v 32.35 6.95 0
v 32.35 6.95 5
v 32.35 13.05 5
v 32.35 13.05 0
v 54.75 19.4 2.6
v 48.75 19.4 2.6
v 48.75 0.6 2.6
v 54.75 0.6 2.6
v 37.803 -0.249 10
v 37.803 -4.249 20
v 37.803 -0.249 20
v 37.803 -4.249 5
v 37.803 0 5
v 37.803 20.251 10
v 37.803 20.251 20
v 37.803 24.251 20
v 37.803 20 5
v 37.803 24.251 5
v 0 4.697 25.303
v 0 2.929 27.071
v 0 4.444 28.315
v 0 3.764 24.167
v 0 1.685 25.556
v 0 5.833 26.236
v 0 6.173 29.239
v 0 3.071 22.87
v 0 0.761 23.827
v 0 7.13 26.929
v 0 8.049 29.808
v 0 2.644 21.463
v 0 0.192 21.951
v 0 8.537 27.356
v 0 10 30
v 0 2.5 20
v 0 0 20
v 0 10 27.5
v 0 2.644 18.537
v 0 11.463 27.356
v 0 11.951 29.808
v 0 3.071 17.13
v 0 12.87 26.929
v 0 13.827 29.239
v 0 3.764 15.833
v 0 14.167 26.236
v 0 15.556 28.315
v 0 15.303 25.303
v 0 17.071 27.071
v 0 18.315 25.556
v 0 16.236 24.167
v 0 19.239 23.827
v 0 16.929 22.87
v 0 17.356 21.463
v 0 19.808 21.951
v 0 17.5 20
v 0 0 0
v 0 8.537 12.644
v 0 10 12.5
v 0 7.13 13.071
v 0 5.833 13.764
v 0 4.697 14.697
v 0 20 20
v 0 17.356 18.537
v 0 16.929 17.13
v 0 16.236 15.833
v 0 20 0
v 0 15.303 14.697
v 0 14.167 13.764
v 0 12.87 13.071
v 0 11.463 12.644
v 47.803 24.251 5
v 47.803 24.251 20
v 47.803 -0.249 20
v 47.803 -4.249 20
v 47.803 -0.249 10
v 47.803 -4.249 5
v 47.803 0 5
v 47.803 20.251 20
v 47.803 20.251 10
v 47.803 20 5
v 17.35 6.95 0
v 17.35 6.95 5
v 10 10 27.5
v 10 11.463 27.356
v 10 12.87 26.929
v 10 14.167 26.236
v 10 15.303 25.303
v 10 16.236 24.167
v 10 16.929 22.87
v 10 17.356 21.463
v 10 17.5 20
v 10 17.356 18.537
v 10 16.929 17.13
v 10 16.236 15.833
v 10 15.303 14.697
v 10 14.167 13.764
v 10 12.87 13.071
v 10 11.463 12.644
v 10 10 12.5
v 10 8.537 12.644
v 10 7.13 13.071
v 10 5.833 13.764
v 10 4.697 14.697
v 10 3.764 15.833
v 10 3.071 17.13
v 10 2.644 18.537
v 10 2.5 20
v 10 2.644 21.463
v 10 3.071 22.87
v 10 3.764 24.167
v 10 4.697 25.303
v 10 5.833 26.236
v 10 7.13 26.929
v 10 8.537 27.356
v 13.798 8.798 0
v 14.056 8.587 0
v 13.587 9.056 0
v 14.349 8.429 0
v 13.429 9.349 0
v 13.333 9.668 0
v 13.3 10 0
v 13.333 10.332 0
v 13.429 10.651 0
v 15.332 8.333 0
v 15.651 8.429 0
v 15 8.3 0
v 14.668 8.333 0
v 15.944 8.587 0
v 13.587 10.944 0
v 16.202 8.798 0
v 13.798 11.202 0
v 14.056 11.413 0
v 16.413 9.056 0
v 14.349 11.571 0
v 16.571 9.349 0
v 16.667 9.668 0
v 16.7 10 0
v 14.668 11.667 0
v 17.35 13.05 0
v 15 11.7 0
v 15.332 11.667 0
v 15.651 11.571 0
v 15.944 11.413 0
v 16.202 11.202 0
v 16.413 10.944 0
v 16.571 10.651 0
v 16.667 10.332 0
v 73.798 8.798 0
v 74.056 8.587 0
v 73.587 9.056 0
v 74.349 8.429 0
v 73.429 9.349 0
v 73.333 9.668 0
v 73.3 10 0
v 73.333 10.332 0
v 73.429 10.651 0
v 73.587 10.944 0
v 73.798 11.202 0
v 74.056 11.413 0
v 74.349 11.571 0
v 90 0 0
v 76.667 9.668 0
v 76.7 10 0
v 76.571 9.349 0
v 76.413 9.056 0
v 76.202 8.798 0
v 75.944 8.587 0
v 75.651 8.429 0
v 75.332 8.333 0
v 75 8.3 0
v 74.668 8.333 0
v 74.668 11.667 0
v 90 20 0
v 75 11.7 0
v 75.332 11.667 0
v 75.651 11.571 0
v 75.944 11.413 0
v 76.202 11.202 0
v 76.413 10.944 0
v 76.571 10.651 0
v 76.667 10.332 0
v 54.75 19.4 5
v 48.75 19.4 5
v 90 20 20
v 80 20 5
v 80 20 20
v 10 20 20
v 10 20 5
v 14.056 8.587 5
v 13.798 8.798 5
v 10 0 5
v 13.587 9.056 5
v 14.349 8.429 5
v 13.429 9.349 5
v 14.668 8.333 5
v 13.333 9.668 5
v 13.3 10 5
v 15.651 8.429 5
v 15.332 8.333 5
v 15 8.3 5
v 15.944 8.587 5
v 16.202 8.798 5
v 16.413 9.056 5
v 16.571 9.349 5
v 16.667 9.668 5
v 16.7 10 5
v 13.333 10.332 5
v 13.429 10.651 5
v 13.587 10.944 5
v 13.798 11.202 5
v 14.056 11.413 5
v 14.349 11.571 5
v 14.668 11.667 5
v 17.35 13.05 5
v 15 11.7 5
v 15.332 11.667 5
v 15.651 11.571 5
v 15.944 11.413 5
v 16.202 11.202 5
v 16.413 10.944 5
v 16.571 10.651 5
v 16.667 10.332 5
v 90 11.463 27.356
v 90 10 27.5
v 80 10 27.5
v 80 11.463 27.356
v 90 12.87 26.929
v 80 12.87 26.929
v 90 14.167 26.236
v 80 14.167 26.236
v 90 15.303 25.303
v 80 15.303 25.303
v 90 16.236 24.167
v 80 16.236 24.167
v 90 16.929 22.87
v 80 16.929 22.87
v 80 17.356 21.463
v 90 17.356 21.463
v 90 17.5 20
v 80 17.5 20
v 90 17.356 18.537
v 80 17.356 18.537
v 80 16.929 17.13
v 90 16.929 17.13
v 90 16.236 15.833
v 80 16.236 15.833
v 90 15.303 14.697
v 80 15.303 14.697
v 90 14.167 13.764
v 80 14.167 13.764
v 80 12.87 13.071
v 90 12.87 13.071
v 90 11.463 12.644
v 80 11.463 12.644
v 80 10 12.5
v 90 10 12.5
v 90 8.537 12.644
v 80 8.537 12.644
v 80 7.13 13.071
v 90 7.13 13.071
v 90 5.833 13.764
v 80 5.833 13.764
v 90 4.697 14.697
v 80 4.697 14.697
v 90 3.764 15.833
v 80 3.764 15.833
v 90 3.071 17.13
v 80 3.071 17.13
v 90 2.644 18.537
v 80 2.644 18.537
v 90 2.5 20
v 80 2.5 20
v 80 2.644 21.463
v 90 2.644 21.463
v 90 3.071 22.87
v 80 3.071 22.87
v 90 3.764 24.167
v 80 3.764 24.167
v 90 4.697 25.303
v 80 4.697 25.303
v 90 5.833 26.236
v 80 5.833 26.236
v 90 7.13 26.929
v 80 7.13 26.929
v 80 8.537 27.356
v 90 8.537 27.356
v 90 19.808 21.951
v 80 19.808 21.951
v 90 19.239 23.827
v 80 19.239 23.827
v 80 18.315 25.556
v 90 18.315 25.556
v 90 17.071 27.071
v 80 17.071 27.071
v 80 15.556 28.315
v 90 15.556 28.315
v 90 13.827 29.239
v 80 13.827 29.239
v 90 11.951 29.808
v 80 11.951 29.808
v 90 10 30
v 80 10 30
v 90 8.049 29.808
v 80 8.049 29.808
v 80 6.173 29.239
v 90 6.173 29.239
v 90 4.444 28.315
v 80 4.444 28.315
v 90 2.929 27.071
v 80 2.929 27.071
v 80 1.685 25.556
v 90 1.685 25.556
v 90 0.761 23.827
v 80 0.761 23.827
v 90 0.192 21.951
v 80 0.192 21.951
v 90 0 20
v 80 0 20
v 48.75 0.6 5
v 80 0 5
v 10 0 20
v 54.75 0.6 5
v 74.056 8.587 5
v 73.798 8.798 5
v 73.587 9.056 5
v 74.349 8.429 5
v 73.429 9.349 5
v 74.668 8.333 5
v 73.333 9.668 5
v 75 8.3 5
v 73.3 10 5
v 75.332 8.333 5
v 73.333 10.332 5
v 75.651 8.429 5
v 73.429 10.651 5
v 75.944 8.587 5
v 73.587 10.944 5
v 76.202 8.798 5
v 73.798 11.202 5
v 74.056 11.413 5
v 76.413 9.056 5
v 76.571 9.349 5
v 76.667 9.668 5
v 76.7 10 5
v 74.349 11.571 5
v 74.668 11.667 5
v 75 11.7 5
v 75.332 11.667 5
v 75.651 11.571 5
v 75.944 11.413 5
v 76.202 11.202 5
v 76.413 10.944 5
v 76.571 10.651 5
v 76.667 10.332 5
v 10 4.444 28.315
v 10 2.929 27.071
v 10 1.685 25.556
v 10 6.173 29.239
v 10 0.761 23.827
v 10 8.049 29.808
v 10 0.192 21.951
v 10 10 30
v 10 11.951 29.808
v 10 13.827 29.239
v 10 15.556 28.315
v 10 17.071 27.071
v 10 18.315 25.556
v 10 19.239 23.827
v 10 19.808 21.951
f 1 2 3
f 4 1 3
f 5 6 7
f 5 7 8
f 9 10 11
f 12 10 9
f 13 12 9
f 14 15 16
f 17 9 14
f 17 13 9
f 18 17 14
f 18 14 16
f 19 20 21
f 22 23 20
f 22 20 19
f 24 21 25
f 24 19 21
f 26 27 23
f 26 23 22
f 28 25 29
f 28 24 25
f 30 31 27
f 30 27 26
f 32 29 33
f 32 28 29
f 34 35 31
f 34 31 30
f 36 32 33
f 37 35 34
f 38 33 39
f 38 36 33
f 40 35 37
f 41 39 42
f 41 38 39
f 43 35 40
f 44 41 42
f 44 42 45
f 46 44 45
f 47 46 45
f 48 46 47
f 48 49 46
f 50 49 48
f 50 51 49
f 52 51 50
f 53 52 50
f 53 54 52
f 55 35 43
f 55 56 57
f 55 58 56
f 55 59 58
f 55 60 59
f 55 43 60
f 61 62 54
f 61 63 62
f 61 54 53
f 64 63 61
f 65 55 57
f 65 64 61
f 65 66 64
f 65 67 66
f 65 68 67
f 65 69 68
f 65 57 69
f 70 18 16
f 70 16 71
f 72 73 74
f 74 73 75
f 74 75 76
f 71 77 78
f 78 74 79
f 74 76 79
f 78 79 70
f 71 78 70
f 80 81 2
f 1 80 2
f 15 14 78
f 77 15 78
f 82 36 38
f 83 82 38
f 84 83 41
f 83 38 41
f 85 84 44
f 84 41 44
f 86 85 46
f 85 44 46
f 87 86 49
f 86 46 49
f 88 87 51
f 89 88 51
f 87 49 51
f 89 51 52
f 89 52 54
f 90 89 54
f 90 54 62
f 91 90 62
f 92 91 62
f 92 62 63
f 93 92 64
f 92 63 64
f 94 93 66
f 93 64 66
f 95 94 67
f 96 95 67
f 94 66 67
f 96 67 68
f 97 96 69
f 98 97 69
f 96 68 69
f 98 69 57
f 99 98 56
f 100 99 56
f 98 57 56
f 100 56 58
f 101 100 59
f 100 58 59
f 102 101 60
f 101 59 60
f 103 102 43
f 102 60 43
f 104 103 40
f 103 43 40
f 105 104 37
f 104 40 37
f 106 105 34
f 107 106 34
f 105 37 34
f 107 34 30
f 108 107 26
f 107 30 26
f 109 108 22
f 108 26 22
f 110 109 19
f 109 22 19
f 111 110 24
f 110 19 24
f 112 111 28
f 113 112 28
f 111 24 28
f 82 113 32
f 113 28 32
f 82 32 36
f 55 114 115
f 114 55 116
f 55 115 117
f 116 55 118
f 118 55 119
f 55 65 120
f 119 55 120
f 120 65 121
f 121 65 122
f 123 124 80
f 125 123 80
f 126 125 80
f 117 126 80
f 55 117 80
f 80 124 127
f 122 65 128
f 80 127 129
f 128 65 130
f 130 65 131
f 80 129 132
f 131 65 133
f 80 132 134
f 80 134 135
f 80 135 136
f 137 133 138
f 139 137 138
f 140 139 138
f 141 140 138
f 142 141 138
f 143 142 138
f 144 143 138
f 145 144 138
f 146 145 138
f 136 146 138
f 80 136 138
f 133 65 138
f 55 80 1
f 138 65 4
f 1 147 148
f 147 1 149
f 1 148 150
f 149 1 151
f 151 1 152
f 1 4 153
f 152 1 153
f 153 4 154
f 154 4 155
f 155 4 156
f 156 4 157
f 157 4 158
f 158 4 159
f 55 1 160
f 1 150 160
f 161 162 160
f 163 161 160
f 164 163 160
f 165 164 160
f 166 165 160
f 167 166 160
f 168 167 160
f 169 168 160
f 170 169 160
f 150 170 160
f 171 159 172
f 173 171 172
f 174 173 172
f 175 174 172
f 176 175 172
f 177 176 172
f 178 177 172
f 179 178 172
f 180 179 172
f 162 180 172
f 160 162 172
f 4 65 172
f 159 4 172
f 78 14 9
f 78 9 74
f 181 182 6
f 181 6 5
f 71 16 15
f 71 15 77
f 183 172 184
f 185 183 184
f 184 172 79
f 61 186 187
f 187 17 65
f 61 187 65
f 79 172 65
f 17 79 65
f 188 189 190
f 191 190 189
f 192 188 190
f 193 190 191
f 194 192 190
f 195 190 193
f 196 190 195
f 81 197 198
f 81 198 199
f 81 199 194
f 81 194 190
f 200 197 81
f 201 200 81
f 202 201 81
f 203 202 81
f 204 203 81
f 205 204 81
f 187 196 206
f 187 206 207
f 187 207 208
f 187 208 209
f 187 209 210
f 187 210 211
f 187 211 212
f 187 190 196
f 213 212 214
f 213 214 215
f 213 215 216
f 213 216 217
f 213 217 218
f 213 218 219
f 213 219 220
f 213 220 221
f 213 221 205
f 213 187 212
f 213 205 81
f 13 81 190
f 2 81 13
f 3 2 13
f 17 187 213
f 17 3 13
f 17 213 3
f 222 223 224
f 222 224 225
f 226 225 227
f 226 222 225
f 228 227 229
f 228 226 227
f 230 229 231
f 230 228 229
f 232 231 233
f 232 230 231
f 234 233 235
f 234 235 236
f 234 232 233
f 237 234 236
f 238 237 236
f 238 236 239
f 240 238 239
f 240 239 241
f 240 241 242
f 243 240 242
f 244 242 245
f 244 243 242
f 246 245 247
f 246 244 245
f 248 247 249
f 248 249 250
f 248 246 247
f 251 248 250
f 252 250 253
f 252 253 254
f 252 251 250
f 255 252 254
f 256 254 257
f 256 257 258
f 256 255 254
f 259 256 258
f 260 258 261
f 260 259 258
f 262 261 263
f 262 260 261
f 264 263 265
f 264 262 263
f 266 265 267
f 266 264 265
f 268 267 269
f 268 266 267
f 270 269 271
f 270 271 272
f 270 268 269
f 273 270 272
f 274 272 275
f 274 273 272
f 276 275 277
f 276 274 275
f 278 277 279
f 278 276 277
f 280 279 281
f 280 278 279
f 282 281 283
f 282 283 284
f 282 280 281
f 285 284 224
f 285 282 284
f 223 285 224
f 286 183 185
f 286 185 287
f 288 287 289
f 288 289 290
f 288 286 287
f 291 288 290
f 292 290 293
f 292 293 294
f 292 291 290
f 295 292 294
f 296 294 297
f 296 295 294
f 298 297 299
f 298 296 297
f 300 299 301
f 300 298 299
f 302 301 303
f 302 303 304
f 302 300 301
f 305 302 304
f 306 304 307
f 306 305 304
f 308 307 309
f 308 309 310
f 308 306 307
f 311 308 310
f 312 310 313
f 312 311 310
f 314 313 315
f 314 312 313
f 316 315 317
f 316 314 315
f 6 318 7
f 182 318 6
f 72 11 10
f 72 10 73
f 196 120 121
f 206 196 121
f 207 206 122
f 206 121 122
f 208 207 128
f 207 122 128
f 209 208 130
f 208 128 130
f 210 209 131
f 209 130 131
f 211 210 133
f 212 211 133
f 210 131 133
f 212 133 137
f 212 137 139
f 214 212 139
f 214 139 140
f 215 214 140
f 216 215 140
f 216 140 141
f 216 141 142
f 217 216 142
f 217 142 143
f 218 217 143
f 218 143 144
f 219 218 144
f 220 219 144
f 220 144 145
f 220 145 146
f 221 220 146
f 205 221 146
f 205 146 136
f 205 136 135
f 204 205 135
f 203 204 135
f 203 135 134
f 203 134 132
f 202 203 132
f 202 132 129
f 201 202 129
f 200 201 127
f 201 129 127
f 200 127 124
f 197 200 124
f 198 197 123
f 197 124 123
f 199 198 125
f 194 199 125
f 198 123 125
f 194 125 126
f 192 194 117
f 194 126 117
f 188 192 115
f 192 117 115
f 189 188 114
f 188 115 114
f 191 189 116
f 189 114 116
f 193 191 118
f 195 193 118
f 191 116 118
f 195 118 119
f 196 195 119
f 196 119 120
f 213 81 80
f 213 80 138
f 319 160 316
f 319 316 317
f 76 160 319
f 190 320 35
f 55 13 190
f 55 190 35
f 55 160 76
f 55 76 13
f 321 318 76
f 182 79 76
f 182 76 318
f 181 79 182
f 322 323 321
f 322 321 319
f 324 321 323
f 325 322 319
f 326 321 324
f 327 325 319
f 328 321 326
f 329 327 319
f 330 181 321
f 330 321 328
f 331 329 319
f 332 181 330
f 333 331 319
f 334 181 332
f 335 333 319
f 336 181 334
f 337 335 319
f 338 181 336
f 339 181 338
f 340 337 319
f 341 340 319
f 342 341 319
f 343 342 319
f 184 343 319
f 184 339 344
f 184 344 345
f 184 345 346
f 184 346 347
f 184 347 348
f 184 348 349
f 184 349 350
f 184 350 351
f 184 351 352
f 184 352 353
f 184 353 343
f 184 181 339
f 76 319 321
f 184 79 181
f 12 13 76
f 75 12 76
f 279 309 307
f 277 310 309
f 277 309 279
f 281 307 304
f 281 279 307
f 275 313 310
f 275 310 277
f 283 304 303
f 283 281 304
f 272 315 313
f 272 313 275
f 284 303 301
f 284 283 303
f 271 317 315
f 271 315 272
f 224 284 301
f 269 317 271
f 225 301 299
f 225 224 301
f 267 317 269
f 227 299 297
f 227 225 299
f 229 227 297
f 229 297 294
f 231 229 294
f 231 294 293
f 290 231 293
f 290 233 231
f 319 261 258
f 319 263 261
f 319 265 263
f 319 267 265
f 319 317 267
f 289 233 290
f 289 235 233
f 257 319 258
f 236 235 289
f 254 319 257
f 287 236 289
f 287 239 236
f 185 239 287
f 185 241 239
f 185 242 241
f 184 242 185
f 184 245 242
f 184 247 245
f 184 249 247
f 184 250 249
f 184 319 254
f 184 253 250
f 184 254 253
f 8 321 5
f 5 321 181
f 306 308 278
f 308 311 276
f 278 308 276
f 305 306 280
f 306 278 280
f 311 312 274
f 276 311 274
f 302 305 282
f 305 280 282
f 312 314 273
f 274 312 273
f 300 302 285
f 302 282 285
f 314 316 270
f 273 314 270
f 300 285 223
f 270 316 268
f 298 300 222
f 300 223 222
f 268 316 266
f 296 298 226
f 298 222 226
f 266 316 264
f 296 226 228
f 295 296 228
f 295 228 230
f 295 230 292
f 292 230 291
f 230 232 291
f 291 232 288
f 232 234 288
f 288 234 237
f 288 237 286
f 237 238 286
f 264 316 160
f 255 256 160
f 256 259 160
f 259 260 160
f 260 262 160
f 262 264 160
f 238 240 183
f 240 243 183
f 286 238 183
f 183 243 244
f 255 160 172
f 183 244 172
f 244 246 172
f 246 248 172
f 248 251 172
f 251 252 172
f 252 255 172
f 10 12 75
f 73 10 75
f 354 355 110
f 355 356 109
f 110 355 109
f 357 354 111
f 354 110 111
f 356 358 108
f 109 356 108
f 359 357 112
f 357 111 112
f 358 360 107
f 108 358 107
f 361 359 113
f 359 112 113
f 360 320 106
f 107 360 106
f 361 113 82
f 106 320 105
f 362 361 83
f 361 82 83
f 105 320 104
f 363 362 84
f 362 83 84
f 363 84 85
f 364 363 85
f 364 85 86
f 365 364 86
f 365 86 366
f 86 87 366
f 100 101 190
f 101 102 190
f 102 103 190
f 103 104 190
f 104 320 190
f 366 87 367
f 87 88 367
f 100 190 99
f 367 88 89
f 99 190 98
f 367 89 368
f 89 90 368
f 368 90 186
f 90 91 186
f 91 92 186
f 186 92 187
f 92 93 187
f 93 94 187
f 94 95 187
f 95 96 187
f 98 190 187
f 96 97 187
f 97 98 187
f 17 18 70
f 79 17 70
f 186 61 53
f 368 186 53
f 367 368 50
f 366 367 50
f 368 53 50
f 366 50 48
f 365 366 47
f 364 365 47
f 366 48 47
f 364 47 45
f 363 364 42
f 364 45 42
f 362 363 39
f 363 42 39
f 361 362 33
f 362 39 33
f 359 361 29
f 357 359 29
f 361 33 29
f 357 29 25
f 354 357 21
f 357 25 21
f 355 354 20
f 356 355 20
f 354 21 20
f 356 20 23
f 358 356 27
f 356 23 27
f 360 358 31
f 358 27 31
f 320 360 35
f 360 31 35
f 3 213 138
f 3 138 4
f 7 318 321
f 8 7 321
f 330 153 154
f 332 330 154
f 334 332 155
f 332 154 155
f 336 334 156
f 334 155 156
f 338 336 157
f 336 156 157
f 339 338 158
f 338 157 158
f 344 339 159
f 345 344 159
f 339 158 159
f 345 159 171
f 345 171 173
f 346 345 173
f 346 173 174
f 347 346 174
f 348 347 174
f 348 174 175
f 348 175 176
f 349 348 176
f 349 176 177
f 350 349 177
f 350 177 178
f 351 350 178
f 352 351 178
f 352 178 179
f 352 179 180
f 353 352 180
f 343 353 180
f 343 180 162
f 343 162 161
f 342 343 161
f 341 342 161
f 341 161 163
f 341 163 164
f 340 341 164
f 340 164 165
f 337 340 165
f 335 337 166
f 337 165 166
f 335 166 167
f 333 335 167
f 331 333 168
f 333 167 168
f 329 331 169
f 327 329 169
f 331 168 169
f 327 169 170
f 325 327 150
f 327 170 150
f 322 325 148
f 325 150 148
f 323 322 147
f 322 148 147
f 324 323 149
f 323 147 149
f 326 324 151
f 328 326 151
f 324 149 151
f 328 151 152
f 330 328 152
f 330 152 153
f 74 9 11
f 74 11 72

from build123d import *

# Parameters (mm, degrees)
ESQUISSE1_W             = 90
ESQUISSE1_H             = 20
BOSS_EXTRU_1_DEPTH      = 5
ESQUISSE2_W             = 10
ESQUISSE2_H             = 20
BOSS_EXTRU_2_DEPTH      = 30
ESQUISSE3_R             = 7.5
ENL_V_MAT_EXTRU_1_DEPTH = 10
ESQUISSE5_W             = 6
ESQUISSE5_H             = 18.8
ENL_V_MAT_EXTRU_2_DEPTH = 2.4
ESQUISSE10_W            = 15
ESQUISSE10_H            = 6.1
ENL_V_MAT_EXTRU_4_DEPTH = 5
ESQUISSE11_R            = 1
ENL_V_MAT_EXTRU_5_DEPTH = 10
D_GAGEMENT_M31_D        = 3.4
ESQUISSE14_W            = 10
ESQUISSE14_H            = 28.5
BOSS_EXTRU_3_DEPTH      = 5
ESQUISSE16_W            = 10
ESQUISSE16_H            = 4
BOSS_EXTRU_4_DEPTH      = 10


with BuildPart() as part:
    # Esquisse1 → Boss.-Extru.1 (new body)
    with BuildSketch(Plane.XY):
        with Locations((45, 10)):
            Rectangle(ESQUISSE1_W, ESQUISSE1_H)
    extrude(amount=BOSS_EXTRU_1_DEPTH)

    # Esquisse2 → Boss.-Extru.2 (add)
    with BuildSketch(Plane.XY.offset(5)):
        with Locations((5, 10)):
            Rectangle(ESQUISSE2_W, ESQUISSE2_H)
    boss_extru_2 = extrude(amount=BOSS_EXTRU_2_DEPTH)

    # Esquisse3 → Enlèv. mat.-Extru.1 (cut)
    with BuildSketch(Plane.ZY):
        with Locations((20, 10)):
            Circle(ESQUISSE3_R)
        with BuildLine():
            Line((35, 20), (20, 20))
            ThreePointArc((20, 20), (30, 10), (20, 0))
            Line((20, 0), (35, 0))
            Line((35, 0), (35, 20))
        make_face()
    enl_v_mat_extru_1 = extrude(amount=-ENL_V_MAT_EXTRU_1_DEPTH, mode=Mode.SUBTRACT)

    # Symétrie1: Boss.-Extru.2, Enlèv. mat.-Extru.1 across plane
    add(boss_extru_2.mirror(Plane(origin=(45, 0, 0), x_dir=(0, 0, 1), z_dir=(1, 0, 0))))
    add(enl_v_mat_extru_1.mirror(Plane(origin=(45, 0, 0), x_dir=(0, 0, 1), z_dir=(1, 0, 0))), mode=Mode.SUBTRACT)

    # Esquisse5 → Enlèv. mat.-Extru.2 (cut)
    with BuildSketch(Plane.XY.offset(5)):
        with Locations((51.75, 10)):
            Rectangle(ESQUISSE5_W, ESQUISSE5_H)
    extrude(amount=-ENL_V_MAT_EXTRU_2_DEPTH, mode=Mode.SUBTRACT)

    # Esquisse10 → Enlèv. mat.-Extru.4 (cut)
    with BuildSketch(Plane.XY.offset(5)):
        with Locations((24.85, 10)):
            Rectangle(ESQUISSE10_W, ESQUISSE10_H)
    extrude(amount=-ENL_V_MAT_EXTRU_4_DEPTH, mode=Mode.SUBTRACT)

    # Esquisse11 → Enlèv. mat.-Extru.5 (cut)
    with BuildSketch(Plane.XY.offset(5)):
        with Locations((15, 10)):
            Circle(ESQUISSE11_R)
        with Locations((75, 10)):
            Circle(ESQUISSE11_R)
    extrude(amount=-ENL_V_MAT_EXTRU_5_DEPTH, mode=Mode.SUBTRACT)

    # Dégagement M31 (through all)
    with Locations(Plane.XY.offset(5)):
        with Locations((15, 10), (75, 10)):
            Hole(D_GAGEMENT_M31_D / 2)

    # Esquisse14 → Boss.-Extru.3 (add)
    with BuildSketch(Plane.XY.offset(5)):
        with Locations((42.803073496, 10.001209338)):
            Rectangle(ESQUISSE14_W, ESQUISSE14_H)
    extrude(amount=BOSS_EXTRU_3_DEPTH)

    # Esquisse16 → Boss.-Extru.4 (add)
    with BuildSketch(Plane.XY.offset(10)):
        with Locations((42.803073496, 22.251209338)):
            Rectangle(ESQUISSE16_W, ESQUISSE16_H)
        with Locations((42.803073496, -2.248790662)):
            Rectangle(ESQUISSE16_W, ESQUISSE16_H)
    extrude(amount=BOSS_EXTRU_4_DEPTH)


solid = part.part
